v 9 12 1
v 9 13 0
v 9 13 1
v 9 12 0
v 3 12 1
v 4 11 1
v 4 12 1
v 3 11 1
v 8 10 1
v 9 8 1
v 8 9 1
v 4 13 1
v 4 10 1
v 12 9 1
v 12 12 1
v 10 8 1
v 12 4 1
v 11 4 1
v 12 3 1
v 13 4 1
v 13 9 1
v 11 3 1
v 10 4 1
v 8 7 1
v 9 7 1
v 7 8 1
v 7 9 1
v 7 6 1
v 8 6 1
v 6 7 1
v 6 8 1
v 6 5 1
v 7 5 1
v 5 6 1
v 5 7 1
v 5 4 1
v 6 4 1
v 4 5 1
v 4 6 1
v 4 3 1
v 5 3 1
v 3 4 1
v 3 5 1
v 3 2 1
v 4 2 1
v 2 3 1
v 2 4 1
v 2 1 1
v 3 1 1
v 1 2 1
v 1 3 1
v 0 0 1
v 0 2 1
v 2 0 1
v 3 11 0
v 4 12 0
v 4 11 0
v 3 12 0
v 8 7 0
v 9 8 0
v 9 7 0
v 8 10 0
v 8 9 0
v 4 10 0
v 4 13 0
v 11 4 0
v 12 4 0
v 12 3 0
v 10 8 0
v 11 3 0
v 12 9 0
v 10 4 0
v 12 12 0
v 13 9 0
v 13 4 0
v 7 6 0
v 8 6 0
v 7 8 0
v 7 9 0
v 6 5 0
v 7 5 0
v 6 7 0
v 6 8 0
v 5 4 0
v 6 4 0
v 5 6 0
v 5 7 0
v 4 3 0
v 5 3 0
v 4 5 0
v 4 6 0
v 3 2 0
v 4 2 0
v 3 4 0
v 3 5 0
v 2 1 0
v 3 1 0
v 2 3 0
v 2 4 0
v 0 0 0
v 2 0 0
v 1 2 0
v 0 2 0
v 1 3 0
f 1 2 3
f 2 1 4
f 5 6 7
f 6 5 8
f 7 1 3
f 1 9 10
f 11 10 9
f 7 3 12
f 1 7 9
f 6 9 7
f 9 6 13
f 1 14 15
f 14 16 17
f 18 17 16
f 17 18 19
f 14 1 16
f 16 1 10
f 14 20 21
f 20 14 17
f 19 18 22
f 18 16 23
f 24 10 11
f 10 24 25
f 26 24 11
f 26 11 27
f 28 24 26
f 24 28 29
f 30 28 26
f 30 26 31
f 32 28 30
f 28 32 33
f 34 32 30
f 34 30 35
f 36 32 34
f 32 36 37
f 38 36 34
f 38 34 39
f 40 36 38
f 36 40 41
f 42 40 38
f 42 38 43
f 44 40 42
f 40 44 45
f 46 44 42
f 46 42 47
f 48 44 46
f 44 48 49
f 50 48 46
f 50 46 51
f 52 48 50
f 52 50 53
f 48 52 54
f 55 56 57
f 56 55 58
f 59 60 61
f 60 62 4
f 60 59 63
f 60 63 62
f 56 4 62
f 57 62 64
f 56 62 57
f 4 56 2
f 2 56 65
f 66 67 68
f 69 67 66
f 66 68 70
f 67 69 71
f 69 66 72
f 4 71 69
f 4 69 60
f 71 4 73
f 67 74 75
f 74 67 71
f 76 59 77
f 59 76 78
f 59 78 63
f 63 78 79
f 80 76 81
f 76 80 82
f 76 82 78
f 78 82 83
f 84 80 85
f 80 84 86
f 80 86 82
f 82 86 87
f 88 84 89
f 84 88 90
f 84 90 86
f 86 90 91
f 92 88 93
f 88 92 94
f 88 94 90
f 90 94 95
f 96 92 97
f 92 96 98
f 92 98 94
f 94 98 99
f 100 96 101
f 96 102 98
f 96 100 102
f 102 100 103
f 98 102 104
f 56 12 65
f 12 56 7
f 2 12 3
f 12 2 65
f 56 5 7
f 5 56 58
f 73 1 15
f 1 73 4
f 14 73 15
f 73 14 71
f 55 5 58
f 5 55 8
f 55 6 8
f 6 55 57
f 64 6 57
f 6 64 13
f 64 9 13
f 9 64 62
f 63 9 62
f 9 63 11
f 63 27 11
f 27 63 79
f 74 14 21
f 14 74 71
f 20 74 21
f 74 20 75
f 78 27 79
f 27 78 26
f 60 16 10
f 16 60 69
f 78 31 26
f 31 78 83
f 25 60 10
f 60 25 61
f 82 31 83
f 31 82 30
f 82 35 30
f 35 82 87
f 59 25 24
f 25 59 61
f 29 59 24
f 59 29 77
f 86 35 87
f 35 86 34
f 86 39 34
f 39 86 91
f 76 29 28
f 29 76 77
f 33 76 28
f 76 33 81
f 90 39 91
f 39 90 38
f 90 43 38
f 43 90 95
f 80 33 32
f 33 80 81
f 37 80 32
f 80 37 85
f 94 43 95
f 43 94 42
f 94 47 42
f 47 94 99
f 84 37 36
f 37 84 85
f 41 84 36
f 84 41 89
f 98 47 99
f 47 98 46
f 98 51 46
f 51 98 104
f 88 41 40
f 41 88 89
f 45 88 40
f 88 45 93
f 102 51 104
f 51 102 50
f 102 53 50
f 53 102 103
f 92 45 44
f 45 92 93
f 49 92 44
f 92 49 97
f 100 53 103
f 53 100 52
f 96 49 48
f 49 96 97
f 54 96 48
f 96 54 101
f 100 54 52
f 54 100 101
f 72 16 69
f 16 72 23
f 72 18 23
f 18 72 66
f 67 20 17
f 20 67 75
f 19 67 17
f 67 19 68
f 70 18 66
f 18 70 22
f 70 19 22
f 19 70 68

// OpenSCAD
//Minecraft Tools
//Developed by Rich Pereira
//rich@pereira.com
//--------------------------
//More to come!
//--------------------------


//CUSTOMIZER VARIABLES

//	Select tool
tool = 2;	//	[1:Spade, 2:Pickaxe, 3:Axe, 4:Hoe, 5:Sword, 6:Egg]

//	Scale (tenths of mm per cube)
cube_size = 20;	//	[1:50]

//CUSTOMIZER VARIABLES END

scale([cube_size/10,cube_size/10,cube_size/10])
if (tool==1) spade();
if (tool==2) pick();
if (tool==3) axe();
if (tool==4) hoe();
if (tool==5) sword();
if (tool==6) egg();


module spade() {
translate([9,12,0]) cube([3,1,1]);
translate([8,11,0]) cube([5,1,1]);
translate([7,10,0]) cube([6,1,1]);
translate([6,9,0]) cube([7,1,1]);
translate([7,8,0]) cube([5,1,1]);
translate([6,7,0]) cube([5,1,1]);
translate([5,6,0]) cube([3,1,1]);
translate([4,5,0]) cube([3,1,1]);
translate([3,4,0]) cube([3,1,1]);
translate([2,3,0]) cube([3,1,1]);
translate([0,2,0]) cube([4,1,1]);
translate([0,1,0]) cube([3,1,1]);
translate([1,0,0]) cube([2,1,1]);
translate([9,6,0]) cube([1,1,1]);
};

module pick() {
translate([4,12,0]) cube([5,1,1]);
translate([3,11,0]) cube([9,1,1]);
translate([4,10,0]) cube([8,1,1]);
translate([8,9,0]) cube([4,1,1]);
translate([7,8,0]) cube([6,1,1]);
translate([6,7,0]) cube([3,1,1]);
translate([5,6,0]) cube([3,1,1]);
translate([4,5,0]) cube([3,1,1]);
translate([3,4,0]) cube([3,1,1]);
translate([2,3,0]) cube([3,1,1]);
translate([1,2,0]) cube([3,1,1]);
translate([0,1,0]) cube([3,1,1]);
translate([0,0,0]) cube([2,1,1]);
translate([10,7,0]) cube([3,1,1]);
translate([10,6,0]) cube([3,1,1]);
translate([10,5,0]) cube([3,1,1]);
translate([10,4,0]) cube([3,1,1]);
translate([11,3,0]) cube([1,1,1]);
};

module axe() {
translate([8,14,0]) cube([2,1,1]);
translate([7,13,0]) cube([4,1,1]);
translate([6,12,0]) cube([5,1,1]);
translate([5,11,0]) cube([7,1,1]);
translate([5,10,0]) cube([7,1,1]);
translate([6,9,0]) cube([7,1,1]);
translate([7,8,0]) cube([6,1,1]);
translate([6,7,0]) cube([3,1,1]);
translate([5,6,0]) cube([3,1,1]);
translate([4,5,0]) cube([3,1,1]);
translate([3,4,0]) cube([3,1,1]);
translate([2,3,0]) cube([3,1,1]);
translate([1,2,0]) cube([3,1,1]);
translate([0,1,0]) cube([3,1,1]);
translate([0,0,0]) cube([2,1,1]);
translate([10,7,0]) cube([2,1,1]);
};

module hoe() {
translate([5,13,0]) cube([3,1,1]);
translate([4,12,0]) cube([5,1,1]);
translate([5,11,0]) cube([7,1,1]);
translate([7,10,0]) cube([5,1,1]);
translate([8,9,0]) cube([4,1,1]);
translate([7,8,0]) cube([4,1,1]);
translate([6,7,0]) cube([3,1,1]);
translate([5,6,0]) cube([3,1,1]);
translate([4,5,0]) cube([3,1,1]);
translate([3,4,0]) cube([3,1,1]);
translate([2,3,0]) cube([3,1,1]);
translate([1,2,0]) cube([3,1,1]);
translate([0,1,0]) cube([3,1,1]);
translate([0,0,0]) cube([2,1,1]);
};

module egg() {
translate([4,12,0]) cube([4,1,1]);
translate([3,11,0]) cube([6,1,1]);
translate([2,10,0]) cube([8,1,1]);
translate([1,9,0]) cube([9,1,1]);
translate([1,8,0]) cube([10,1,1]);
translate([0,7,0]) cube([11,1,1]);
translate([0,6,0]) cube([12,1,1]);
translate([0,5,0]) cube([12,1,1]);
translate([0,4,0]) cube([12,1,1]);
translate([1,3,0]) cube([10,1,1]);
translate([1,2,0]) cube([10,1,1]);
translate([2,1,0]) cube([8,1,1]);
translate([3,0,0]) cube([6,1,1]);
};

module sword() {
translate([13,15,0]) cube ([3,1,1]);
translate([12,14,0]) cube ([4,1,1]);
translate([11,13,0]) cube ([5,1,1]);
translate([10,12,0]) cube ([5,1,1]);
translate([9,11,0]) cube ([5,1,1]);
translate([8,10,0]) cube ([5,1,1]);
translate([2,9,0]) cube ([2,1,1]);
translate([2,8,0]) cube ([3,1,1]);
translate([3,7,0]) cube ([7,1,1]);
translate([3,6,0]) cube ([6,1,1]);
translate([4,5,0]) cube ([4,1,1]);
translate([3,4,0]) cube ([6,1,1]);
translate([2,3,0]) cube ([3,1,1]);
translate([0,2,0]) cube ([4,1,1]);
translate([0,1,0]) cube ([3,1,1]);
translate([0,0,0]) cube ([3,1,1]);
translate([7,9,0]) cube ([5,1,1]);
translate([6,8,0]) cube ([5,1,1]);
translate([6,3,0]) cube ([4,1,1]);
translate([8,2,0]) cube ([2,1,1]);
};
